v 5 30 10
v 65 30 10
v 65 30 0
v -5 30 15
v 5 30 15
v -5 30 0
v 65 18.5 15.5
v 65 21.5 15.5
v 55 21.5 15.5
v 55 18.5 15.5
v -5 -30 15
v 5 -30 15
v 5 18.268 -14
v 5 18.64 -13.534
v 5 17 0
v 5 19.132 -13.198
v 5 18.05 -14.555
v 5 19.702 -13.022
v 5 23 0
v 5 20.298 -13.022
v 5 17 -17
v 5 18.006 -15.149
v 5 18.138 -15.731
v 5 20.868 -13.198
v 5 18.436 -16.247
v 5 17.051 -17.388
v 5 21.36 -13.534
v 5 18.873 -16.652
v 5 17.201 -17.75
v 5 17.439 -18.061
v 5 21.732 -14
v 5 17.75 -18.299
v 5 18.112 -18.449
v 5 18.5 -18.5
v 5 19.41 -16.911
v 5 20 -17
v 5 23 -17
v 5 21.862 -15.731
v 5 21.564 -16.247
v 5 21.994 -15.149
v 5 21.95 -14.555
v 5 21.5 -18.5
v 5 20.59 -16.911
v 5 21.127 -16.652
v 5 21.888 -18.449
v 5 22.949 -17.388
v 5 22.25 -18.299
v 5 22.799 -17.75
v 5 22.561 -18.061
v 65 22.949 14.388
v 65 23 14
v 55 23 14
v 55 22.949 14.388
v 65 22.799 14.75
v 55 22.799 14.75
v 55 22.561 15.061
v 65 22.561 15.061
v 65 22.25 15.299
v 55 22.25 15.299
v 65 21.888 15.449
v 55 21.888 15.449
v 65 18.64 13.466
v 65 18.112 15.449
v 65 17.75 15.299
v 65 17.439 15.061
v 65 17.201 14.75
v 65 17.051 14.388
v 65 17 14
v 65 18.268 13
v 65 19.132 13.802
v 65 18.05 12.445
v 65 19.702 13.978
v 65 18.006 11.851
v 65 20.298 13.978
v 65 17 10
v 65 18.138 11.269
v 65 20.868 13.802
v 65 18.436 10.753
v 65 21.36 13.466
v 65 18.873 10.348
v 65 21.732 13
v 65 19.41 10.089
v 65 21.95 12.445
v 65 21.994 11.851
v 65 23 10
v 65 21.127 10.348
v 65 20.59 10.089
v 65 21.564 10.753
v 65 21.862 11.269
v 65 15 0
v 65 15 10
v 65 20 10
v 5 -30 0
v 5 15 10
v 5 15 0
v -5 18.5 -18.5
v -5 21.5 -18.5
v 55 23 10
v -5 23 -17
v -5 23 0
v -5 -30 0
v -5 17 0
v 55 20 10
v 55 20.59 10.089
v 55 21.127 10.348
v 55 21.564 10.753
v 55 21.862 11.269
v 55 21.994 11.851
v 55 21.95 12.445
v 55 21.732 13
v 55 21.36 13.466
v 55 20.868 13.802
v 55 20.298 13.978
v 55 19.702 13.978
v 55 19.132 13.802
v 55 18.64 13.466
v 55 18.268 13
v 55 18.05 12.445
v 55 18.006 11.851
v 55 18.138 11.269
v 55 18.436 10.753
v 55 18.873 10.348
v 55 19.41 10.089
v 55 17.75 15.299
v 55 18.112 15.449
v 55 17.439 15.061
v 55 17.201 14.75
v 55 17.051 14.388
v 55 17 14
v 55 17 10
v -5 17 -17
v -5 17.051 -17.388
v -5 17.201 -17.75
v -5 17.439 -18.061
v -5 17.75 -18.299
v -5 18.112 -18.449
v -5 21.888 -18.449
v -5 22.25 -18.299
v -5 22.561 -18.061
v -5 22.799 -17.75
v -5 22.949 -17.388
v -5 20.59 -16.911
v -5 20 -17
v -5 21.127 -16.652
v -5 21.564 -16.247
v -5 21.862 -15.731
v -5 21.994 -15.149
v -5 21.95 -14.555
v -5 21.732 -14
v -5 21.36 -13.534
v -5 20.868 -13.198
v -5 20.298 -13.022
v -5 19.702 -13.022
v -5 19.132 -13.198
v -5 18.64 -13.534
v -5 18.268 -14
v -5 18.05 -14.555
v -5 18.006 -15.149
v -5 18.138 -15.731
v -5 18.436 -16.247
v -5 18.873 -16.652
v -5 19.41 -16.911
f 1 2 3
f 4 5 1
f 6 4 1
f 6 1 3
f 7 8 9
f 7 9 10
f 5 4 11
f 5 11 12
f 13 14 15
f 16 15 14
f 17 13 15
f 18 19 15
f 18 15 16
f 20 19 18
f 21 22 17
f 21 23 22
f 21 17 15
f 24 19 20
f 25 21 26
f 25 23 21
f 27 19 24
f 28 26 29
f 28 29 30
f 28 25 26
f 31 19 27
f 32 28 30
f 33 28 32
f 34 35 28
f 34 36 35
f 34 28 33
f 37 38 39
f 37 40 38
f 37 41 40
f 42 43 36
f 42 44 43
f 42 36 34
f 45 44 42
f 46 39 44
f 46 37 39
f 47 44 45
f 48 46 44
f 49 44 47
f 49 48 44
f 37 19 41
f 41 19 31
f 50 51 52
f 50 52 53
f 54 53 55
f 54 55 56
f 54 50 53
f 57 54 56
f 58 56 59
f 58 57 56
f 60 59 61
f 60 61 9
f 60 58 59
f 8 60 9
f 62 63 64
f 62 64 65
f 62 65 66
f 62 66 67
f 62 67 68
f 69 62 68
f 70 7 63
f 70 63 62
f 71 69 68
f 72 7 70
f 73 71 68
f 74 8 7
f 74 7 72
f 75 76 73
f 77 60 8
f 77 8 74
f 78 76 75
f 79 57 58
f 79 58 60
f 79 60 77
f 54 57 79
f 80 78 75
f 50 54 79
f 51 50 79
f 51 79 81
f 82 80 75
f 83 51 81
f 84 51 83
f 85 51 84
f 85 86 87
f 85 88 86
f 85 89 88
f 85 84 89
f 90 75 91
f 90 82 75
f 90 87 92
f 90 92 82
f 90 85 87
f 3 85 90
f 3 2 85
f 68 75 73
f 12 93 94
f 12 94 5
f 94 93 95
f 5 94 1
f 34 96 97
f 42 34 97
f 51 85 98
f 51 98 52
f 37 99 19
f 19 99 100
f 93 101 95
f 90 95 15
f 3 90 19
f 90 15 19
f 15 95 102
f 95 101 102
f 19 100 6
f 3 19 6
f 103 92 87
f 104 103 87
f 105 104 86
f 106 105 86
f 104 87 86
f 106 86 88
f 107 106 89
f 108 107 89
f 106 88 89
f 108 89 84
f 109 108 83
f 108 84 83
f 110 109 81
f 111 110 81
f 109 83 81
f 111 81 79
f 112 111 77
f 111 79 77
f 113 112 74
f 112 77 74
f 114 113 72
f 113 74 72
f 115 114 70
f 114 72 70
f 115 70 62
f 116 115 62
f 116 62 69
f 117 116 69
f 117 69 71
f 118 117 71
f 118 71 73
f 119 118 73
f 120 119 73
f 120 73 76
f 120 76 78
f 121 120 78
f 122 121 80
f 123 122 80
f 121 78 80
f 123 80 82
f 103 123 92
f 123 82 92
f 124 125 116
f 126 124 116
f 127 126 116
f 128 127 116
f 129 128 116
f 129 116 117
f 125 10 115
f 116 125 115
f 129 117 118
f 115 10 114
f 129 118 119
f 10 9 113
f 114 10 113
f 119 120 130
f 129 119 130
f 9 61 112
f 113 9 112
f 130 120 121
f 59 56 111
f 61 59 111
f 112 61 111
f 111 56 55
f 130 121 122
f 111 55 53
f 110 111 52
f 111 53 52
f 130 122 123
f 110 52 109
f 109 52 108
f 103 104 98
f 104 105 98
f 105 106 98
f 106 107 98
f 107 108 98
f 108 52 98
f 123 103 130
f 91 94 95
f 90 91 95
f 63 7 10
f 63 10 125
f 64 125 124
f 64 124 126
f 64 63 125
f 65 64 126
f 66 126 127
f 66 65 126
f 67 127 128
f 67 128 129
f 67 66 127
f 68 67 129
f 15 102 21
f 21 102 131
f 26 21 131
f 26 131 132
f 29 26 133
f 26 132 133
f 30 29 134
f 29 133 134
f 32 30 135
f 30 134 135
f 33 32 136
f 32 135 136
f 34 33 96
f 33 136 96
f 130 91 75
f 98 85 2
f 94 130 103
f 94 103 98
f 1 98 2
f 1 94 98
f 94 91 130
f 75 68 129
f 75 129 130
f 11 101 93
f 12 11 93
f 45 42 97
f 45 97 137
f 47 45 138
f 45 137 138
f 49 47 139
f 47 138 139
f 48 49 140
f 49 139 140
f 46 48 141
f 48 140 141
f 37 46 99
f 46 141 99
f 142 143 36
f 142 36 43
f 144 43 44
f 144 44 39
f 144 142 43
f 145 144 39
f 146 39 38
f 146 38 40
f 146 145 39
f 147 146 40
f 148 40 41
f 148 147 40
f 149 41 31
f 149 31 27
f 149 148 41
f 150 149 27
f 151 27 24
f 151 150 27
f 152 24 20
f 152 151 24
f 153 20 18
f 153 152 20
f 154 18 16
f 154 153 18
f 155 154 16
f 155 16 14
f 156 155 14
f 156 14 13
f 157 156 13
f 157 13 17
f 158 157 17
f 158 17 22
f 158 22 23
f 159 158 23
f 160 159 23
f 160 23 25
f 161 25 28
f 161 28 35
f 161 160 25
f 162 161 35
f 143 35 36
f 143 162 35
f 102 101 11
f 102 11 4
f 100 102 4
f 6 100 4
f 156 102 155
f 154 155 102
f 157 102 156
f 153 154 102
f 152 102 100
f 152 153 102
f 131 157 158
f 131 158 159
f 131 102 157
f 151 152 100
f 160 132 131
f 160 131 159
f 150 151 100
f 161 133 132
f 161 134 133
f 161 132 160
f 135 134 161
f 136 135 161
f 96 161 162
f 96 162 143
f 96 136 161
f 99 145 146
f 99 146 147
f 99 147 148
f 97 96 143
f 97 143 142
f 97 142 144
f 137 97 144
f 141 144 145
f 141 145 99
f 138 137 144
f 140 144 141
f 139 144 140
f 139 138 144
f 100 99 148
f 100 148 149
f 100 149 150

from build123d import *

# Parameters (mm, degrees)
SKETCH1_W           = 10
SKETCH1_H           = 60
BOSS_EXTRUDE1_DEPTH = 15
SKETCH4_W           = 10
SKETCH4_H           = 15
BOSS_EXTRUDE2_DEPTH = 60
BOSS_EXTRUDE4_DEPTH = 10
SKETCH6_R           = 2
CUT_EXTRUDE1_DEPTH  = 10
SKETCH7_R           = 2
BOSS_EXTRUDE6_DEPTH = 10


with BuildPart() as part:
    # Sketch1 → Boss-Extrude1 (new body)
    with BuildSketch(Plane.XY):
        Rectangle(SKETCH1_W, SKETCH1_H)
    extrude(amount=BOSS_EXTRUDE1_DEPTH)

    # Sketch4 → Boss-Extrude2 (add)
    with BuildSketch(Plane(origin=(5, 0, 0), x_dir=(0, 0, -1), z_dir=(1, 0, 0))):
        with Locations((-5, 22.5)):
            Rectangle(SKETCH4_W, SKETCH4_H)
    extrude(amount=BOSS_EXTRUDE2_DEPTH)

    # Sketch5 → Boss-Extrude4 (add)
    # profile 1 of 5: a face of its own
    with BuildSketch(Plane(origin=(65, 0, 0), x_dir=(0, 0, -1), z_dir=(1, 0, 0))):
        with BuildLine():
            Line((-10, 20), (-10, 23))
            Line((-10, 23), (-14, 23))
            ThreePointArc((-14, 23), (-15.060660172, 22.560660172), (-15.5, 21.5))
            Line((-15.5, 21.5), (-15.5, 18.5))
            ThreePointArc((-15.5, 18.5), (-15.060660172, 17.439339828), (-14, 17))
            Line((-14, 17), (-10, 17))
            Line((-10, 17), (-10, 20))
        make_face()
        with BuildLine():
            ThreePointArc((-14, 20), (-12, 22), (-10, 20))
            ThreePointArc((-10, 20), (-12, 18), (-14, 20))
        make_face(mode=Mode.SUBTRACT)
    # profile 2 of 5: a face of its own
    with BuildSketch(Plane(origin=(65, 0, 0), x_dir=(0, 0, -1), z_dir=(1, 0, 0))):
        with BuildLine():
            ThreePointArc((-14, 20), (-12, 18), (-10, 20))
            Line((-10, 20), (-12, 20))
            Line((-12, 20), (-14, 20))
        make_face()
    # profile 3 of 5: a face of its own
    with BuildSketch(Plane(origin=(65, 0, 0), x_dir=(0, 0, -1), z_dir=(1, 0, 0))):
        with BuildLine():
            Line((-12, 20), (-10, 20))
            ThreePointArc((-10, 20), (-12, 22), (-14, 20))
            Line((-14, 20), (-12, 20))
        make_face()
    # profile 4 of 5: a face of its own
    with BuildSketch(Plane(origin=(65, 0, 0), x_dir=(0, 0, -1), z_dir=(1, 0, 0))):
        with BuildLine():
            ThreePointArc((-14, 20), (-12, 18), (-10, 20))
            Line((-10, 20), (-12, 20))
            Line((-12, 20), (-14, 20))
        make_face()
    # profile 5 of 5: a face of its own
    with BuildSketch(Plane(origin=(65, 0, 0), x_dir=(0, 0, -1), z_dir=(1, 0, 0))):
        with BuildLine():
            Line((-12, 20), (-10, 20))
            ThreePointArc((-10, 20), (-12, 22), (-14, 20))
            Line((-14, 20), (-12, 20))
        make_face()
    extrude(amount=-BOSS_EXTRUDE4_DEPTH)

    # Sketch6 → Cut-Extrude1 (cut)
    with BuildSketch(Plane(origin=(65, 0, 0), x_dir=(0, 0, -1), z_dir=(1, 0, 0))):
        with Locations((-12, 20)):
            Circle(SKETCH6_R)
    extrude(amount=-CUT_EXTRUDE1_DEPTH, mode=Mode.SUBTRACT)

    # Sketch7 → Boss-Extrude6 (add)
    with BuildSketch(Plane(origin=(-5, 0, 0), x_dir=(0, 0, -1), z_dir=(1, 0, 0))):
        with BuildLine():
            Line((10, 23), (0, 23))
            Line((0, 23), (0, 17))
            Line((0, 17), (10, 17))
            Line((10, 17), (17, 17))
            ThreePointArc((17, 17), (18.060660172, 17.439339828), (18.5, 18.5))
            Line((18.5, 18.5), (18.5, 21.5))
            ThreePointArc((18.5, 21.5), (18.060660172, 22.560660172), (17, 23))
            Line((17, 23), (10, 23))
        make_face()
        with Locations((15, 20)):
            Circle(SKETCH7_R, mode=Mode.SUBTRACT)
    extrude(amount=BOSS_EXTRUDE6_DEPTH)


solid = part.part
